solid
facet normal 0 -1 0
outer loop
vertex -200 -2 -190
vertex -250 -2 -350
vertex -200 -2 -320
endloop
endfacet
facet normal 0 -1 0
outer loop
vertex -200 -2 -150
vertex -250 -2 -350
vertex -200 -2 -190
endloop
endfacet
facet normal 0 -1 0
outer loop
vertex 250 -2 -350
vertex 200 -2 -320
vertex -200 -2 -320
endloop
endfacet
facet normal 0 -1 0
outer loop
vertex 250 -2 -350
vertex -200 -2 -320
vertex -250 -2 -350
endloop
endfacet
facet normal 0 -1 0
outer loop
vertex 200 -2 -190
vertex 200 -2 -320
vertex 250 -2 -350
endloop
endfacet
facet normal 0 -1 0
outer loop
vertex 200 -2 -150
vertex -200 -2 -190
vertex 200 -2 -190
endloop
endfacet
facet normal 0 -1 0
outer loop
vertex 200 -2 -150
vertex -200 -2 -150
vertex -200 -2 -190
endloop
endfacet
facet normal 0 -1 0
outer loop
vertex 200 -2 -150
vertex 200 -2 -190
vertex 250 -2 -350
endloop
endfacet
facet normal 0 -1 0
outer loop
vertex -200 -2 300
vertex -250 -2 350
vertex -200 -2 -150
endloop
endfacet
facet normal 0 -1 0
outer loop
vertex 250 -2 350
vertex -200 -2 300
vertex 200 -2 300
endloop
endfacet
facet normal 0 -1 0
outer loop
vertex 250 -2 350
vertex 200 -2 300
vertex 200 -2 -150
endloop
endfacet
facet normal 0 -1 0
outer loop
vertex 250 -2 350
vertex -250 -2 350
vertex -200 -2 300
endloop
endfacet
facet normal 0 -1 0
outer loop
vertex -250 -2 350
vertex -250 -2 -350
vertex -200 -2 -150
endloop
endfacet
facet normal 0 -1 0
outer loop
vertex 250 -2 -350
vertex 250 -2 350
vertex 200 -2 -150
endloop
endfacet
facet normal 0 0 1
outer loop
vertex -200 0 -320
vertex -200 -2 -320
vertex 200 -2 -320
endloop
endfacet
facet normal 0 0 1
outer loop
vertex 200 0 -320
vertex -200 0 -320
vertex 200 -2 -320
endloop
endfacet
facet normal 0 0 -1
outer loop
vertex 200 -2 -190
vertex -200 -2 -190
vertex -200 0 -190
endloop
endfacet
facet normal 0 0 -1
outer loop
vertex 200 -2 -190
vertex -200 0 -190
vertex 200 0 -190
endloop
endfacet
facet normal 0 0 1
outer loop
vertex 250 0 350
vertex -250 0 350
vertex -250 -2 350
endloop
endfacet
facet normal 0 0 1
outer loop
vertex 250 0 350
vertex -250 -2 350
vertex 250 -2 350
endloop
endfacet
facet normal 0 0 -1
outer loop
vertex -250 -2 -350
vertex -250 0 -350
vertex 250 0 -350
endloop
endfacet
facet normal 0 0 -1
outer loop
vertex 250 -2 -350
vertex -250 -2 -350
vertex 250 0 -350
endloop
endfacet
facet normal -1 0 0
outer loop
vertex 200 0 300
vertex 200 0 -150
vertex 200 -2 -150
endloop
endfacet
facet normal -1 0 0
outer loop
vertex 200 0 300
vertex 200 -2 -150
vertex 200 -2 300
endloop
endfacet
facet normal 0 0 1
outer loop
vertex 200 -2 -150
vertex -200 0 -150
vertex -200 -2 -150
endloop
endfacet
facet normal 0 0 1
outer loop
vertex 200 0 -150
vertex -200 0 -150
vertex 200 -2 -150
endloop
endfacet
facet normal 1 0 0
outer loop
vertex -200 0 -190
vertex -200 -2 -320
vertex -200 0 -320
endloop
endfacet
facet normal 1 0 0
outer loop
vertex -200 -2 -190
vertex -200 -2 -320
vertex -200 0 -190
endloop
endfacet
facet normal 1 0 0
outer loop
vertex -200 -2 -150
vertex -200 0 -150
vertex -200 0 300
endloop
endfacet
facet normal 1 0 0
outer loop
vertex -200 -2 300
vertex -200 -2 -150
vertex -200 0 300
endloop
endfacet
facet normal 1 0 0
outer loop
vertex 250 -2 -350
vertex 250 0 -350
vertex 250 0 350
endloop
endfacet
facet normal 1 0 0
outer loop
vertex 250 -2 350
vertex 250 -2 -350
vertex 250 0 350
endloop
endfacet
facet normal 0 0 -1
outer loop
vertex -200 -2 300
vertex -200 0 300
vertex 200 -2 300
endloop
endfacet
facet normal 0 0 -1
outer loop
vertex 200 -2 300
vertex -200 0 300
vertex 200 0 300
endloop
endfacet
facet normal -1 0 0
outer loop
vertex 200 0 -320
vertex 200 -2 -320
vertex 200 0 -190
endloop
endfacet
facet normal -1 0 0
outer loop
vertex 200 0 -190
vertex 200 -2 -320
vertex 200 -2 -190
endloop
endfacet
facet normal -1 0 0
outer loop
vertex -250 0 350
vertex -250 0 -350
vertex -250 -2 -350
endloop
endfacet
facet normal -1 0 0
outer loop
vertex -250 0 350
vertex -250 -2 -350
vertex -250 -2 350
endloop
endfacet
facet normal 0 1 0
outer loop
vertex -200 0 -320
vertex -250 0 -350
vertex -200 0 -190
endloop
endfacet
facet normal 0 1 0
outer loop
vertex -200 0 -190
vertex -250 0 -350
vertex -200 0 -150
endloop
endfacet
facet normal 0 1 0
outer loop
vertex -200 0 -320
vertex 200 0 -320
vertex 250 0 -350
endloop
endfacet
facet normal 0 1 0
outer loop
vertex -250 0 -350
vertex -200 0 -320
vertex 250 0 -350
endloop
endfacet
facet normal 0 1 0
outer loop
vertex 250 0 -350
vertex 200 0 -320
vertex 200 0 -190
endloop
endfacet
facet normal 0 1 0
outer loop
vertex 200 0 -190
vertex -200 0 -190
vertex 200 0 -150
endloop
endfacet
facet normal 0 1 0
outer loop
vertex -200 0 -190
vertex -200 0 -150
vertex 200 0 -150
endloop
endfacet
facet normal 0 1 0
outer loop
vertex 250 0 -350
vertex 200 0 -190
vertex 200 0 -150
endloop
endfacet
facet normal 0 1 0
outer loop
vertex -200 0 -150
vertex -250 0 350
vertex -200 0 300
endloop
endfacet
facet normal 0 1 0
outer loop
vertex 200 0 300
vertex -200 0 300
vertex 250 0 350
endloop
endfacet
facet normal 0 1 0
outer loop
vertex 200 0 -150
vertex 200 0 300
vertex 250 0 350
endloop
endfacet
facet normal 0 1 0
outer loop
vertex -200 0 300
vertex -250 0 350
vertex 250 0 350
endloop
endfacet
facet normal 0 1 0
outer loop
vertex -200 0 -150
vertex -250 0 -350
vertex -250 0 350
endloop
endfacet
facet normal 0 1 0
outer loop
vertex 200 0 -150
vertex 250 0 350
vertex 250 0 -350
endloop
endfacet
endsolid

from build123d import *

# Parameters (mm, degrees)
F0_W     = 500
F0_H     = 700
F0_W_2   = 400
F0_H_2   = 450
F1_DEPTH = 2
F2_W     = 400
F2_H     = 130
F3_DEPTH = 4


with BuildPart() as f1:
    # F0 (on Front) → F1 (new body)
    with BuildSketch(Plane.XZ):
        Rectangle(F0_W, F0_H)
        with Locations((0, 75)):
            Rectangle(F0_W_2, F0_H_2, mode=Mode.SUBTRACT)
    extrude(amount=F1_DEPTH)

    # F2 (on face) → F3 (cut)
    with BuildSketch(Plane.XZ.offset(2)):
        with Locations((0, -255)):
            Rectangle(F2_W, F2_H)
    extrude(amount=-F3_DEPTH, mode=Mode.SUBTRACT)


solid = f1.part
